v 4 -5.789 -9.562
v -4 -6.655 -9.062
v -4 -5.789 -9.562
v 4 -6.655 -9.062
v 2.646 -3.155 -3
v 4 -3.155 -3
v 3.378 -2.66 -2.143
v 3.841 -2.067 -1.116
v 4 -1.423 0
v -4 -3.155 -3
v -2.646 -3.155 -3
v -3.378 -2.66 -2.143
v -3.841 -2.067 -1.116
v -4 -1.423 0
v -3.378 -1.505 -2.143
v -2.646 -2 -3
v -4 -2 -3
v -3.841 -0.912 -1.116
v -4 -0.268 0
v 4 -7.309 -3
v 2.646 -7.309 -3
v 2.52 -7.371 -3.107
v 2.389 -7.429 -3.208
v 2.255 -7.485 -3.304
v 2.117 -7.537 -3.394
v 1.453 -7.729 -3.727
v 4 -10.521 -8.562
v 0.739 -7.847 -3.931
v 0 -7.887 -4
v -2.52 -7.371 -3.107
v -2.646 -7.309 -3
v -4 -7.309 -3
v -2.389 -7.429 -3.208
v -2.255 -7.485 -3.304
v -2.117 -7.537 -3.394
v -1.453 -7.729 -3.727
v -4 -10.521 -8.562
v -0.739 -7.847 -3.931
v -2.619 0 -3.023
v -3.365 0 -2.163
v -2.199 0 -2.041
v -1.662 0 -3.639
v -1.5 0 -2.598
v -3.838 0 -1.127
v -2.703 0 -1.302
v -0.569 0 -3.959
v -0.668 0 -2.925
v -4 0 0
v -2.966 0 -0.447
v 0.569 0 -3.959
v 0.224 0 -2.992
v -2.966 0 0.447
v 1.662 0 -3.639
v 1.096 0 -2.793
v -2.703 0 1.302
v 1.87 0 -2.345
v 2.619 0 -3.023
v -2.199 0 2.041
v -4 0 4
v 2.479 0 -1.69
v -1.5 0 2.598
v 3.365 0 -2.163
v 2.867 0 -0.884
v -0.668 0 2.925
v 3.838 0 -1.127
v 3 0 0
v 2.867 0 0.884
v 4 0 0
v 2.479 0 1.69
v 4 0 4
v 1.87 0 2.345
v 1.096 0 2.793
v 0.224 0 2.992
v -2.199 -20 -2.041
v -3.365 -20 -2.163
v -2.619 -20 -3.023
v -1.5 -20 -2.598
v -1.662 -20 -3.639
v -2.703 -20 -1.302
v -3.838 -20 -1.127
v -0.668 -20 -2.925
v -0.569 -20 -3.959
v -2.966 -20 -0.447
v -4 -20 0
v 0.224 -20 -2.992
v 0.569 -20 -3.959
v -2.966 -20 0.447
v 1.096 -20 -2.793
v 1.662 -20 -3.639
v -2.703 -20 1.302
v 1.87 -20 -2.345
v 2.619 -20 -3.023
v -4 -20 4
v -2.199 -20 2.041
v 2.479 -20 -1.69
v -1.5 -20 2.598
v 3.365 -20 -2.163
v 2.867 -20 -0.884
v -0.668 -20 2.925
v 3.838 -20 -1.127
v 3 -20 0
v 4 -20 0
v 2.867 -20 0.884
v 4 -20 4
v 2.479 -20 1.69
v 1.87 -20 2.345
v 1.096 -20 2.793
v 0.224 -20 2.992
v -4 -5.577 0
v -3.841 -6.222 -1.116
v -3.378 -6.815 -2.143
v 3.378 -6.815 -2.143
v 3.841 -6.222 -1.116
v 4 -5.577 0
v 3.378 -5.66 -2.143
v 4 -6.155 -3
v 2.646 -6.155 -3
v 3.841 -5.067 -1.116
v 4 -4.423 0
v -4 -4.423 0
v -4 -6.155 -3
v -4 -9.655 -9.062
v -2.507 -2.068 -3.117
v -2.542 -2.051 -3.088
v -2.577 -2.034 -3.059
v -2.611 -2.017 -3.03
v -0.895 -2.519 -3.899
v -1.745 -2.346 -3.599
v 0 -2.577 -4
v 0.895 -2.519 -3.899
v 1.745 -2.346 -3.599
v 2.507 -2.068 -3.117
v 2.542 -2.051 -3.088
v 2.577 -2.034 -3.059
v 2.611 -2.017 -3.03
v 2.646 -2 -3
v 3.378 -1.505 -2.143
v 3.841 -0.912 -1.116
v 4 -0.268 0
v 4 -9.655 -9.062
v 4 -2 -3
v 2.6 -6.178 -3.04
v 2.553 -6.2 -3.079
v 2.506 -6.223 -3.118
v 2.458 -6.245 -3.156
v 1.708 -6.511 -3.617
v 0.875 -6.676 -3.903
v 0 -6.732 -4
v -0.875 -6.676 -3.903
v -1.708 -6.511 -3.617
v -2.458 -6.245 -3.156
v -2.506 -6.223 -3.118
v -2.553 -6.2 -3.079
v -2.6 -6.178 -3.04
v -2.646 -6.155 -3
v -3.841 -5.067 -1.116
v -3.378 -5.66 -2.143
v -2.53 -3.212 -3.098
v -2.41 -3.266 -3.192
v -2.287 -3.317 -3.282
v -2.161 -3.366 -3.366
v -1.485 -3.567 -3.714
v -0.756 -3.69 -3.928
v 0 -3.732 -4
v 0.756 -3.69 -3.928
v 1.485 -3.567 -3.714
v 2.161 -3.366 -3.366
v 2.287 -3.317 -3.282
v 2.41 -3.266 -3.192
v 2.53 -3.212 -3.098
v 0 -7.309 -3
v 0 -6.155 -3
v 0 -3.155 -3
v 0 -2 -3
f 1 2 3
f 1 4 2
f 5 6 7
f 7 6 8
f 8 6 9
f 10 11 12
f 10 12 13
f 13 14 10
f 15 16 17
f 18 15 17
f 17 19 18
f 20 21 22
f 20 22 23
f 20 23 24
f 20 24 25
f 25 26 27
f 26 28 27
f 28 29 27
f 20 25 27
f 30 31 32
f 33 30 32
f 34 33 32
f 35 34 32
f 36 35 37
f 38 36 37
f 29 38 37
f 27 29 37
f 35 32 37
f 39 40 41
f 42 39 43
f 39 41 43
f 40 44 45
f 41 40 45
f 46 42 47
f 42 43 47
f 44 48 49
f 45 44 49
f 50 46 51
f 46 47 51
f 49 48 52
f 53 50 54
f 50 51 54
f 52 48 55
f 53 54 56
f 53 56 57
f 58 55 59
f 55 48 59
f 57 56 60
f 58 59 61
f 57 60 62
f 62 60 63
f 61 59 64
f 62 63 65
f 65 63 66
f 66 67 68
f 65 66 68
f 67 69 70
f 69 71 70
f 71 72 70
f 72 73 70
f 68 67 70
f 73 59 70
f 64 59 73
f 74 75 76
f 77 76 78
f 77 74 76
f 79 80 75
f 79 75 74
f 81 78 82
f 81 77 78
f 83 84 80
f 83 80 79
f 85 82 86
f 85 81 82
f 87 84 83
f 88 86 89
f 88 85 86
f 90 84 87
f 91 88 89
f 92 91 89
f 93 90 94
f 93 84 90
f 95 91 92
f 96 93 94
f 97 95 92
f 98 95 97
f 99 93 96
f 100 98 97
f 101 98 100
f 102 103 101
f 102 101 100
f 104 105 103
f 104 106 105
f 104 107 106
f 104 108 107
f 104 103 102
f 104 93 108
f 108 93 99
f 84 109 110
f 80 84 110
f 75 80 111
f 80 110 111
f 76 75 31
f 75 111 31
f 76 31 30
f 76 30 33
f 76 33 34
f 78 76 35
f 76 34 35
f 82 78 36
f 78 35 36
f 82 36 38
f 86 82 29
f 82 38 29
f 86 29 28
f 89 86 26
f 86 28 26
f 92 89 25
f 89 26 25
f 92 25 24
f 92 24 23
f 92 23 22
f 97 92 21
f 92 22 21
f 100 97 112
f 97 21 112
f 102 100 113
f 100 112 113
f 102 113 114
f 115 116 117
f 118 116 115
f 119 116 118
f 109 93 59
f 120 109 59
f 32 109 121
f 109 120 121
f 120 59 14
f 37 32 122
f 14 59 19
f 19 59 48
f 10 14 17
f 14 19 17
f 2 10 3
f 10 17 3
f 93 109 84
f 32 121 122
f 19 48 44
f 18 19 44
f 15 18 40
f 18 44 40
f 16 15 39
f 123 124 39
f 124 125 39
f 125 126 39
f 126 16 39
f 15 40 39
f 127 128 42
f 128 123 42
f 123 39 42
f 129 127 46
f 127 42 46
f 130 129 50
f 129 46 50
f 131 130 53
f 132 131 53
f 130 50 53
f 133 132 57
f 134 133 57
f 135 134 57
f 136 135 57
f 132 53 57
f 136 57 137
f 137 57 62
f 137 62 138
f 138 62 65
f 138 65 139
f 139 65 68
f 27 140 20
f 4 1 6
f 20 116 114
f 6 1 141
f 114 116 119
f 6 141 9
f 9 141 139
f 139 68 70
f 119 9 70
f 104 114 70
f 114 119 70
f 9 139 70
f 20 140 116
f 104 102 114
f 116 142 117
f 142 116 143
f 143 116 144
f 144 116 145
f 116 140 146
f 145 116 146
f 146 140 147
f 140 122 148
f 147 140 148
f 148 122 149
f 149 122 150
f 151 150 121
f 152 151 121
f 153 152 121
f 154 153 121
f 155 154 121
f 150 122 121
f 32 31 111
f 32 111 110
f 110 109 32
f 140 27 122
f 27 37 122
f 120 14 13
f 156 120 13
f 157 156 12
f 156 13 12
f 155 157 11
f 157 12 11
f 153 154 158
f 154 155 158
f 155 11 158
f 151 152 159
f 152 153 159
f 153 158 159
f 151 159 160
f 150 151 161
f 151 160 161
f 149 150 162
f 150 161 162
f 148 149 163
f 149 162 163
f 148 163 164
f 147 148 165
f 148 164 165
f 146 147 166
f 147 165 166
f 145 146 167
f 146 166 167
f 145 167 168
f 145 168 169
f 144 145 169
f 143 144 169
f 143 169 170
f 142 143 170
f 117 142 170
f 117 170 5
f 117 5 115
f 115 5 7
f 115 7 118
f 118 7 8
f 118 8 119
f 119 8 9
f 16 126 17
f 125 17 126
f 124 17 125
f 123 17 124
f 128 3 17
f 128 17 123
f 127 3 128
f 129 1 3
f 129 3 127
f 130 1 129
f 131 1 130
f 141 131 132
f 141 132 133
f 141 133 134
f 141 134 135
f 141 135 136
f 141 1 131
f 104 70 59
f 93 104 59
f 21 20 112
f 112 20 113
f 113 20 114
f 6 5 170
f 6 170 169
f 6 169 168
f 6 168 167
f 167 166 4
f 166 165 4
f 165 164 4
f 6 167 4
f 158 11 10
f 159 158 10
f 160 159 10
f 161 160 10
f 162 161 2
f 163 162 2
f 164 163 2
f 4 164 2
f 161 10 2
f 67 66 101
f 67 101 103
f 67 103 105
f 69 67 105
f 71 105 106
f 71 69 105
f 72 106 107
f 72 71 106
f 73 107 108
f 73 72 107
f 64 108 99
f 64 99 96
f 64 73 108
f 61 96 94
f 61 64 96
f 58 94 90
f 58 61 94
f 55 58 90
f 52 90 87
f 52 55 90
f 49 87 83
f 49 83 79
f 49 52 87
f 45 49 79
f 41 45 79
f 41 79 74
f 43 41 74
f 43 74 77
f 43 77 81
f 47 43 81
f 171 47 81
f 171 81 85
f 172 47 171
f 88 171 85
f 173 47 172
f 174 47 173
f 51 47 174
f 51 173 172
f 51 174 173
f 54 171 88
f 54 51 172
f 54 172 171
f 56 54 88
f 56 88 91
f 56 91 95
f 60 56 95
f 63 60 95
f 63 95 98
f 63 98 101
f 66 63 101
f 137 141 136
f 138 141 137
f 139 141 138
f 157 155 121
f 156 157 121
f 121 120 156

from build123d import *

# Parameters (mm, degrees)
F0_R          = 3
F1_DEPTH      = 20
F3_DEPTH      = 4
F3_DEPTH_BACK = 4
F6_DEPTH      = 1
F9_DEPTH      = 1
F10_DEPTH     = 20


with BuildPart() as f1:
    # F0 (on Front) → F1 (new body)
    with BuildSketch(Plane.XZ):
        with BuildLine():
            ThreePointArc((-4, 0), (0, -4), (4, 0))
            ThreePointArc((4, 0), (2.8284271247, 2.8284271247), (0, 4))
            ThreePointArc((0, 4), (-2.8284271247, 2.8284271247), (-4, 0))
        make_face()
        Circle(F0_R, mode=Mode.SUBTRACT)
    extrude(amount=F1_DEPTH)

    # F2 (on Right) → F3 (join, two sides)
    with BuildSketch(Plane.YZ) as f3_sk:
        Polygon((-5.7886751346, -9.5621778265), (-2, -3), (-3.1547005384, -3), (-6.6547005384, -9.0621778265), align=None)
        Polygon((-9.6547005384, -9.0621778265), (-6.1547005384, -3), (-7.3094010768, -3), (-10.5207259422, -8.5621778265), align=None)
    extrude(amount=F3_DEPTH)
    extrude(f3_sk.sketch, amount=-F3_DEPTH_BACK)

    # F5 (on offset) → F6 (join)
    with BuildSketch(Plane(origin=(0, -0.2009618943, 0.1160254038), x_dir=(-1, 0, 0), z_dir=(0, 0.8660254038, -0.5))):
        Polygon((4, -5), (4, 0), (2, -5), align=None)
        Polygon((-2, -5), (-4, 0), (-4, -5), align=None)
    extrude(amount=-F6_DEPTH)

    # F8 (on offset) → F9 (join)
    with BuildSketch(Plane(origin=(0, -3.3169872981, 1.9150635095), x_dir=(-1, 0, 0), z_dir=(0, 0.8660254038, -0.5))):
        Polygon((4, -7), (4, -2), (2, -7), align=None)
        Polygon((-4, -7), (-2, -7), (-4, -2), align=None)
    extrude(amount=-F9_DEPTH)

    # F0 (on Front) → F10 (join)
    with BuildSketch(Plane.XZ):
        with BuildLine():
            ThreePointArc((-4, 0), (0, -4), (4, 0))
            ThreePointArc((4, 0), (2.8284271247, 2.8284271247), (0, 4))
            ThreePointArc((0, 4), (-2.8284271247, 2.8284271247), (-4, 0))
        make_face()
        Circle(F0_R, mode=Mode.SUBTRACT)
        with BuildLine():
            ThreePointArc((0, 4), (2.8284271247, 2.8284271247), (4, 0))
            Line((4, 0), (4, 4))
            Line((4, 4), (0, 4))
        make_face()
        with BuildLine():
            ThreePointArc((-4, 0), (-2.8284271247, 2.8284271247), (0, 4))
            Line((0, 4), (-4, 4))
            Line((-4, 4), (-4, 0))
        make_face()
    extrude(amount=F10_DEPTH)


solid = f1.part
